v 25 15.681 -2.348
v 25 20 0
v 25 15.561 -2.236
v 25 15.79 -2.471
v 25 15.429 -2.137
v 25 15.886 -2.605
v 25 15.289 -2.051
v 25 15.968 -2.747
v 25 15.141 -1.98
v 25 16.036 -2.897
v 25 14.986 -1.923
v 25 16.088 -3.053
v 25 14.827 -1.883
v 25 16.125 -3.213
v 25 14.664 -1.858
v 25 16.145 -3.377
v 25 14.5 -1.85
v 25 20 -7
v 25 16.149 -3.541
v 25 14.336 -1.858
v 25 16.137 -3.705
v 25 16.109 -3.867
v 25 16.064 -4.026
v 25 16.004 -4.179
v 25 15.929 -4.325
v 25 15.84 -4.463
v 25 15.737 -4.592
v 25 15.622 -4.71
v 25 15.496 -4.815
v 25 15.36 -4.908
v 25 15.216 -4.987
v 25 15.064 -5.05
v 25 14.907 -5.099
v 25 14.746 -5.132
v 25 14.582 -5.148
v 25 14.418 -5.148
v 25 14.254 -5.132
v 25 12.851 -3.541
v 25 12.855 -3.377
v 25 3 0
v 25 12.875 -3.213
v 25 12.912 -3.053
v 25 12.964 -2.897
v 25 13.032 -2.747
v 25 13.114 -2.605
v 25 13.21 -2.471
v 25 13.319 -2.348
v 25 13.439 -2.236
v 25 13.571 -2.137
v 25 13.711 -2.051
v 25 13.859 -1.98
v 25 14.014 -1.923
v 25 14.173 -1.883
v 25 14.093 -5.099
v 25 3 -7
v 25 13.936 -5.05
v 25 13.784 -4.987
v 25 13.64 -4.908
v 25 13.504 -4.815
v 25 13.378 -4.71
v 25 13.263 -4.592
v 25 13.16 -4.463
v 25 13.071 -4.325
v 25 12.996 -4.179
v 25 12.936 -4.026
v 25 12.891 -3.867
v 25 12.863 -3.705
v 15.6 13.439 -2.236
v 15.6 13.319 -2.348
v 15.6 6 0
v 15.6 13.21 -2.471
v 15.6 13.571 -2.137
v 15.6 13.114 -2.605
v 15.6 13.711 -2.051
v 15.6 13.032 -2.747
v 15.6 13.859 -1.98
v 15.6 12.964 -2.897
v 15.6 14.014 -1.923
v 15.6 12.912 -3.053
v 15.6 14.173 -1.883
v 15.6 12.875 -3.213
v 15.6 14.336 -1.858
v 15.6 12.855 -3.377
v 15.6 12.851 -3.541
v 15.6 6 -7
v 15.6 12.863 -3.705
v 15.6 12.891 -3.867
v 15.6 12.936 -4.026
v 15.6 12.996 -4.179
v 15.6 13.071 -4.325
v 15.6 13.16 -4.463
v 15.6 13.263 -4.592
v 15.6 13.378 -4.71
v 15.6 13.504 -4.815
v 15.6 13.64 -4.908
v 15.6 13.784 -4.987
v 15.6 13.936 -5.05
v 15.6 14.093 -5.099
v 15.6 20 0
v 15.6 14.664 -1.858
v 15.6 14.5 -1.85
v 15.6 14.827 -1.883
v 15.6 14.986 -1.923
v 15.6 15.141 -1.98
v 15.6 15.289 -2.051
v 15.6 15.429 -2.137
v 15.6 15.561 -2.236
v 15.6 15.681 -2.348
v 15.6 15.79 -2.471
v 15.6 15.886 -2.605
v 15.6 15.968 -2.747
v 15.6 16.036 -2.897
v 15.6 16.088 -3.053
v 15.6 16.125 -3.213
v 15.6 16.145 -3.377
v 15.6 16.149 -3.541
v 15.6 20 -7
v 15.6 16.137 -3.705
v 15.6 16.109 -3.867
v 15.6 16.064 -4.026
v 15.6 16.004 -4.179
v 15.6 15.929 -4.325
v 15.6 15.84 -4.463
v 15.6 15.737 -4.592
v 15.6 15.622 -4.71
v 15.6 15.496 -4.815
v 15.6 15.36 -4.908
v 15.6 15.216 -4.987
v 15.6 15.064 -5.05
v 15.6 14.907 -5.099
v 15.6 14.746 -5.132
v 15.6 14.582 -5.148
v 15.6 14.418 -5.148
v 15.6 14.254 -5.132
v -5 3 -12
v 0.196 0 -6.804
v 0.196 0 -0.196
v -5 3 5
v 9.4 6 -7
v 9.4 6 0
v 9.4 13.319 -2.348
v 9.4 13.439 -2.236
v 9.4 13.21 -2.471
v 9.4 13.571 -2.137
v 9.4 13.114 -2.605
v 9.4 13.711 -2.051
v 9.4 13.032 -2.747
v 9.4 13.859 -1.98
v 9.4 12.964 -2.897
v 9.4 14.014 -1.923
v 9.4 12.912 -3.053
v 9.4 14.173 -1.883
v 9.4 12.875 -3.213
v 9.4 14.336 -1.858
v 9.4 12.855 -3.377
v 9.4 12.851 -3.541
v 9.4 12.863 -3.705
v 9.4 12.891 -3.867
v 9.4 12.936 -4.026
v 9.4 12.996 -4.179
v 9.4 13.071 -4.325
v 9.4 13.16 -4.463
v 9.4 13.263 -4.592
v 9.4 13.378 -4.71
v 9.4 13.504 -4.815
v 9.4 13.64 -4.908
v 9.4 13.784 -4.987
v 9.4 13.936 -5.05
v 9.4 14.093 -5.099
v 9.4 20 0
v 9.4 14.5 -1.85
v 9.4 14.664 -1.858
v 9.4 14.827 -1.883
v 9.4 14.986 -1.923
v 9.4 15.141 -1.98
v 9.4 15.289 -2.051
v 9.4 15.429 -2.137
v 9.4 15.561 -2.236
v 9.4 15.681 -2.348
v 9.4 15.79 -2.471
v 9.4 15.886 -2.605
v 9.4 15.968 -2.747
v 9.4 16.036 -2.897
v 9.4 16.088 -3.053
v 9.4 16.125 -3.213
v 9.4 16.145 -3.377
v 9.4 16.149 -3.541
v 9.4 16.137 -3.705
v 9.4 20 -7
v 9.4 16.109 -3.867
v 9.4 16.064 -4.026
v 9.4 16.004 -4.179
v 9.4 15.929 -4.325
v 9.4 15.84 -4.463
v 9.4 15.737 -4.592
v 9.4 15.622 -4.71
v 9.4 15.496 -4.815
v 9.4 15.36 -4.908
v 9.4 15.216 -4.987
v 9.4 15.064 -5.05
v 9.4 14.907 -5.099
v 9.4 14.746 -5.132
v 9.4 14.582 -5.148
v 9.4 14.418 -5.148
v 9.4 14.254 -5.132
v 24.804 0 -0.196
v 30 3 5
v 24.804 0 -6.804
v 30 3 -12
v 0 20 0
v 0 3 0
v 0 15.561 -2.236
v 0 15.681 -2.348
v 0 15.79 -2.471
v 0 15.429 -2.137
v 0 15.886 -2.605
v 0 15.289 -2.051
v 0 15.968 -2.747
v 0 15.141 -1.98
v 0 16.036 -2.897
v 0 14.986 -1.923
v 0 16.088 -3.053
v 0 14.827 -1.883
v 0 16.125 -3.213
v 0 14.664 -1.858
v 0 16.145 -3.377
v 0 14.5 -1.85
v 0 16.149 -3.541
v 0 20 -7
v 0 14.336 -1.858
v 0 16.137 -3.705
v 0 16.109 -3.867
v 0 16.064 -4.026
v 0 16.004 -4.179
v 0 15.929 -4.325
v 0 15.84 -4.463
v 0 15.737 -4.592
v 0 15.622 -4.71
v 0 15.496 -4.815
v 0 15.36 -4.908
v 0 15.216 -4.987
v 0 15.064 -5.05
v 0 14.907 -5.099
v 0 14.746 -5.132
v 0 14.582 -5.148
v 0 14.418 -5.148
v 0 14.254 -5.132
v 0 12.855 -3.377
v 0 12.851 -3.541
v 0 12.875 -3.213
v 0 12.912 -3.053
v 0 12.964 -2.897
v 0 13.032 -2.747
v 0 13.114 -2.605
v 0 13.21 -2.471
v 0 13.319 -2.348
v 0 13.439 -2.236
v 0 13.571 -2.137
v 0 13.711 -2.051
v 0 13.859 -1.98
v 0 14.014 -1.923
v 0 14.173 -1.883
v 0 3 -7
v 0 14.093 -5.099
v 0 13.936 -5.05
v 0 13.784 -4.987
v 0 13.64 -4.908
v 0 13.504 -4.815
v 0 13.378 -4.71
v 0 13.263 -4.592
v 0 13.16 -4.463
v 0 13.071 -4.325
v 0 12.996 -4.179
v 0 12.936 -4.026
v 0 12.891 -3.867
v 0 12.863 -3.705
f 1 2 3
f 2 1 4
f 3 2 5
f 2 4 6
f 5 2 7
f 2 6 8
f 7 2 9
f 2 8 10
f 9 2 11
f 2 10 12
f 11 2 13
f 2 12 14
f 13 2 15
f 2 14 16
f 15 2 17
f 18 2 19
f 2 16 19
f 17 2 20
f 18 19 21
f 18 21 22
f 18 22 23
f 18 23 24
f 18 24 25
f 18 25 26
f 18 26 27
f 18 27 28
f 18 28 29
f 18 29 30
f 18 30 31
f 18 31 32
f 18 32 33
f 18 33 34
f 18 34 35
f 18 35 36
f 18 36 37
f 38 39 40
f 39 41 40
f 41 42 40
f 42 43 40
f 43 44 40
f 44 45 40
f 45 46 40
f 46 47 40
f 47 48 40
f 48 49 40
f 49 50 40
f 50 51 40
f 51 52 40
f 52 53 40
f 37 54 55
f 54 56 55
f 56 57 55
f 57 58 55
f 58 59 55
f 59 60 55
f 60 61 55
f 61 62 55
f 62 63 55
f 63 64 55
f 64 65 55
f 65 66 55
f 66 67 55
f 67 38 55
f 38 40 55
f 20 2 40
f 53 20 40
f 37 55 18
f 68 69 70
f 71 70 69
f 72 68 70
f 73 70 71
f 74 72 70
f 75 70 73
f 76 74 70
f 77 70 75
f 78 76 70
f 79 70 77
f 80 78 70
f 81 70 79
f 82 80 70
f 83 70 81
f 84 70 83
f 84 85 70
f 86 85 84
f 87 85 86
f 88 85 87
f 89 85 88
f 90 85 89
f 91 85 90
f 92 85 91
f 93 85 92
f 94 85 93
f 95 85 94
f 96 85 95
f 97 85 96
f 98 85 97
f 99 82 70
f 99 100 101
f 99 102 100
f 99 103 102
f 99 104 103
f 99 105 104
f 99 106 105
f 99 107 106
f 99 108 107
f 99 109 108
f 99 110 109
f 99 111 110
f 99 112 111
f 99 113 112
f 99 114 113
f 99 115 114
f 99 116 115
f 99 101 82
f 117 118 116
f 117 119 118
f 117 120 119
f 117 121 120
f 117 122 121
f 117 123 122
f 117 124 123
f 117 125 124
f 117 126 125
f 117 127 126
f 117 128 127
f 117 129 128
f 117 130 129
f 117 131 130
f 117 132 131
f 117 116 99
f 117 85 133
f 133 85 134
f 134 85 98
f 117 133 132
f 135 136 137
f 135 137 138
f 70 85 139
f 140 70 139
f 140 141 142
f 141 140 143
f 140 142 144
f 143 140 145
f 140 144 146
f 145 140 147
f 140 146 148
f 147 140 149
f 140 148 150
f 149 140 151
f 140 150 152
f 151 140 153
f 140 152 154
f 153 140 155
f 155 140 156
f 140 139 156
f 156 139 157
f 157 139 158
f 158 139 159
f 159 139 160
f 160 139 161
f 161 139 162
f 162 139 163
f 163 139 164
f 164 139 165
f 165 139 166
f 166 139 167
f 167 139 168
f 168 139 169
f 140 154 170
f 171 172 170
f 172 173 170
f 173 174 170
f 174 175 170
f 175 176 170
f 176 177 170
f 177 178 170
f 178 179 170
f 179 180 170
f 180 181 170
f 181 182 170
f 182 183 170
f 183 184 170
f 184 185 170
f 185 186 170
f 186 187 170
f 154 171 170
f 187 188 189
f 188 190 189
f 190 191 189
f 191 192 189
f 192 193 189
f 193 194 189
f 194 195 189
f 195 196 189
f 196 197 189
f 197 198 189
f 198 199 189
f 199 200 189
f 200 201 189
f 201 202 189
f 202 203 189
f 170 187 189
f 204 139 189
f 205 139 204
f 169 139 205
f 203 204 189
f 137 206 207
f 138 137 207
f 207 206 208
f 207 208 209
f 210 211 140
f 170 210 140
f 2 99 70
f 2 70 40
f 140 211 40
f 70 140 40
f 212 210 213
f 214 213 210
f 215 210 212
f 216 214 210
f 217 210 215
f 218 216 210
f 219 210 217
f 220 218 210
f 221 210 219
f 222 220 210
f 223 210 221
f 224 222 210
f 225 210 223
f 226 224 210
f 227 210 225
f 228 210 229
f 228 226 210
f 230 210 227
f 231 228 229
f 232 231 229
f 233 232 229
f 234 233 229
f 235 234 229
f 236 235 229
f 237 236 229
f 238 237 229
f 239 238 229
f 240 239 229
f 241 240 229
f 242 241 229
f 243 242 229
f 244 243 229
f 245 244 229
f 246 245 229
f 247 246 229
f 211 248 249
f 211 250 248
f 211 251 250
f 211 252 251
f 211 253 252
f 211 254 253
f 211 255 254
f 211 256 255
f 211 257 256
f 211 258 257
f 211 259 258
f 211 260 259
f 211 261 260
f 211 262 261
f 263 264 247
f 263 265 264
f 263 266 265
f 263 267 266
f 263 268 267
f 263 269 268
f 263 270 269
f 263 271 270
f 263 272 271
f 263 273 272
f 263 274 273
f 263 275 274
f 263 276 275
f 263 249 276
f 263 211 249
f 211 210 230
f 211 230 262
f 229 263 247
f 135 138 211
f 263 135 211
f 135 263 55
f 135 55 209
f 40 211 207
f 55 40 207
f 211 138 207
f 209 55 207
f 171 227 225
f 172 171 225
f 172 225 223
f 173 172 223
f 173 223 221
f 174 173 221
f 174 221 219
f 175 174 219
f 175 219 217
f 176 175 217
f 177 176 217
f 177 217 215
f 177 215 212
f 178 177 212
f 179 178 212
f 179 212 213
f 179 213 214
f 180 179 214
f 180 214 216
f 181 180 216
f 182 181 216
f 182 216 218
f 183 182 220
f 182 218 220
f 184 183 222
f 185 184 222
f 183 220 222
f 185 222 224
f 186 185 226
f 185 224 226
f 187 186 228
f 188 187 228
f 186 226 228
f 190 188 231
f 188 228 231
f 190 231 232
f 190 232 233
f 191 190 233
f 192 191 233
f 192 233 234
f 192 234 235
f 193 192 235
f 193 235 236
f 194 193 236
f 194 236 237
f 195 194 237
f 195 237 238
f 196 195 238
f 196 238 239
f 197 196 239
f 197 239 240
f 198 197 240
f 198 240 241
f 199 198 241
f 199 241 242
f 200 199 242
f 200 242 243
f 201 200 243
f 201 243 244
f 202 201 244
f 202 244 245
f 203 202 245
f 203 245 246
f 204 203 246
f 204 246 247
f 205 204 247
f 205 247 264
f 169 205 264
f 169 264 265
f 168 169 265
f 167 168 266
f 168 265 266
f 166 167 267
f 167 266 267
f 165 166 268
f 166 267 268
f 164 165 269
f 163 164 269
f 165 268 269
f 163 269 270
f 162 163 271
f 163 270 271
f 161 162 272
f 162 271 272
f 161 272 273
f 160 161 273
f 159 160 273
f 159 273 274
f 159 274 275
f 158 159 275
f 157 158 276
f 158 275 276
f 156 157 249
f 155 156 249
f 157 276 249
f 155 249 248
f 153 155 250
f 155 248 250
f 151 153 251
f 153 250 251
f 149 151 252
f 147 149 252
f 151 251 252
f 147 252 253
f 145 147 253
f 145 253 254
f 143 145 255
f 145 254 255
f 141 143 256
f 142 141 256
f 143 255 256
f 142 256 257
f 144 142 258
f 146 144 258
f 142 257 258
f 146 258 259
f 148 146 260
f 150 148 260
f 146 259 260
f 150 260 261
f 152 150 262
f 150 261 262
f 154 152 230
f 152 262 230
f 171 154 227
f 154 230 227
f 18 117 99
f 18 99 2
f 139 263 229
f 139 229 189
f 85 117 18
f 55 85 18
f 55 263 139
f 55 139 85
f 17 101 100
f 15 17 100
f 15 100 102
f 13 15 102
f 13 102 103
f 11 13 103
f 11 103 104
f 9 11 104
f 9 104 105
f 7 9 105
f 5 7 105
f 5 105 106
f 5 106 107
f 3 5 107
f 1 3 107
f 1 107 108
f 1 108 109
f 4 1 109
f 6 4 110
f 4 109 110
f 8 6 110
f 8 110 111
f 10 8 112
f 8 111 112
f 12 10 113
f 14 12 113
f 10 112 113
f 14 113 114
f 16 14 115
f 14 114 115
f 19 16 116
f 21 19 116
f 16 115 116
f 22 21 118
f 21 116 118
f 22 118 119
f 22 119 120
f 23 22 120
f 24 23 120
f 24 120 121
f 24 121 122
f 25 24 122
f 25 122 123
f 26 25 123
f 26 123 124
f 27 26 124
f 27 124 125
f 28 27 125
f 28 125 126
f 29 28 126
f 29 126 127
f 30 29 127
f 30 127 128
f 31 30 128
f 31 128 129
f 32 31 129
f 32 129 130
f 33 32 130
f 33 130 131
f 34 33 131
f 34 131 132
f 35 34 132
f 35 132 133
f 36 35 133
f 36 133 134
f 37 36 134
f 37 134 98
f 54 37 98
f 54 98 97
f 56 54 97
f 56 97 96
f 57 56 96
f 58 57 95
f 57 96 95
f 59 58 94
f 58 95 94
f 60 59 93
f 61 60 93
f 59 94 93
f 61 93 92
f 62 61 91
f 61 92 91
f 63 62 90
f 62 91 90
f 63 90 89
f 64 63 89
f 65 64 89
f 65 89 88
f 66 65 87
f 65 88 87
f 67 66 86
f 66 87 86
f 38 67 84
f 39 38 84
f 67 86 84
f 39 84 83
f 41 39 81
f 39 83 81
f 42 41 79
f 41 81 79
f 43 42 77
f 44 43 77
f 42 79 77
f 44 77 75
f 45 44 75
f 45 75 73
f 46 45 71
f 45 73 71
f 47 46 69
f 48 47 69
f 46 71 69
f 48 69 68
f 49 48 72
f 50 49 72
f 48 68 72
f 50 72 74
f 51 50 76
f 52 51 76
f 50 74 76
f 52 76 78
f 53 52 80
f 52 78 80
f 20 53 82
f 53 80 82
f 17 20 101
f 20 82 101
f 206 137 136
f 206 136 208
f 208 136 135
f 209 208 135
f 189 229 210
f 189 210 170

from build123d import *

# Parameters (mm, degrees)
SKETCH1_W           = 25
SKETCH1_H           = 7
BOSS_EXTRUDE1_DEPTH = 20
SKETCH2_W           = 35
SKETCH2_H           = 17
BOSS_EXTRUDE2_DEPTH = 3
CHAMFER1_SIZE       = 5.196152423
CHAMFER1_SIZE_2     = 3
SKETCH3_W           = 6.2
SKETCH3_H           = 14
CUT_EXTRUDE1_DEPTH  = 7
CUT_EXTRUDE2_REACH  = 40
SKETCH4_R           = 1.65


with BuildPart() as part:
    # Sketch1 → Boss-Extrude1 (new body)
    with BuildSketch(Plane(origin=(0, 0, 0), x_dir=(1, 0, 0), z_dir=(0, 1, 0))):
        with Locations((12.5, 3.5)):
            Rectangle(SKETCH1_W, SKETCH1_H)
    extrude(amount=BOSS_EXTRUDE1_DEPTH)

    # Sketch2 → Boss-Extrude2 (add)
    with BuildSketch(Plane.XZ):
        with Locations((12.5, -3.5)):
            Rectangle(SKETCH2_W, SKETCH2_H)
    extrude(amount=-BOSS_EXTRUDE2_DEPTH)

    # Chamfer1
    # the kernel refuses this chamfer: 5.196152423, 3 mm, written as the material it takes off along each edge
    with BuildSketch(Plane(origin=(30, 0, 18.442891912), x_dir=(-0.9998132206222079, -0.01932676561270063, 0), z_dir=(0, 0, -1)), Plane(origin=(-5, 0, -25.442891912), x_dir=(0.9998132206222079, -0.019326765612700626, 0), z_dir=(0, 0, 1))) as chamfer1_piece_1:
        Polygon((CHAMFER1_SIZE * 0.999813220566, CHAMFER1_SIZE * 0.0193267656116), (-CHAMFER1_SIZE_2 * 0.0193267656127, CHAMFER1_SIZE_2 * 0.999813220622), (0, 0), align=None)
    extrude(amount=43.885783824, mode=Mode.SUBTRACT)
    with BuildSketch(Plane(origin=(-18.442891912, 0, 5), x_dir=(0, -0.019326765612700626, -0.9998132206222079), z_dir=(1, 0, 0)), Plane(origin=(43.442891912, 0, -12), x_dir=(0, -0.019326765612700622, 0.9998132206222079), z_dir=(-1, 0, 0))) as chamfer1_piece_2:
        Polygon((CHAMFER1_SIZE * 0.999813220566, CHAMFER1_SIZE * 0.0193267656116), (-CHAMFER1_SIZE_2 * 0.0193267656127, CHAMFER1_SIZE_2 * 0.999813220622), (0, 0), align=None)
    extrude(amount=61.885783824, mode=Mode.SUBTRACT)

    # Sketch3 → Cut-Extrude1 (cut)
    with BuildSketch(Plane(origin=(0, 0, -7), x_dir=(-1, 0, 0), z_dir=(0, 0, -1))):
        with Locations((-12.5, 13)):
            Rectangle(SKETCH3_W, SKETCH3_H)
    extrude(amount=-CUT_EXTRUDE1_DEPTH, mode=Mode.SUBTRACT)

    # Cut-Extrude2: up to this face of the body (flat: up to its plane)
    cut_extrude2_end = Plane(part.part.faces().sort_by_distance((25, 11.5, -3.5))[0])
    # Sketch4 → Cut-Extrude2 (cut, up to the picked face)
    with BuildSketch(Plane.ZY, mode=Mode.PRIVATE) as cut_extrude2_sk1:
        with Locations((-3.5, 14.5)):
            Circle(SKETCH4_R)
    cut_extrude2_tool1 = split(extrude(cut_extrude2_sk1.sketch, amount=-CUT_EXTRUDE2_REACH, mode=Mode.PRIVATE), bisect_by=cut_extrude2_end, keep=Keep.BOTH, mode=Mode.PRIVATE)
    add(cut_extrude2_tool1.solids().sort_by(Axis((0, 14.5, -3.5), (1, 0, 0)))[0], mode=Mode.SUBTRACT)


solid = part.part
